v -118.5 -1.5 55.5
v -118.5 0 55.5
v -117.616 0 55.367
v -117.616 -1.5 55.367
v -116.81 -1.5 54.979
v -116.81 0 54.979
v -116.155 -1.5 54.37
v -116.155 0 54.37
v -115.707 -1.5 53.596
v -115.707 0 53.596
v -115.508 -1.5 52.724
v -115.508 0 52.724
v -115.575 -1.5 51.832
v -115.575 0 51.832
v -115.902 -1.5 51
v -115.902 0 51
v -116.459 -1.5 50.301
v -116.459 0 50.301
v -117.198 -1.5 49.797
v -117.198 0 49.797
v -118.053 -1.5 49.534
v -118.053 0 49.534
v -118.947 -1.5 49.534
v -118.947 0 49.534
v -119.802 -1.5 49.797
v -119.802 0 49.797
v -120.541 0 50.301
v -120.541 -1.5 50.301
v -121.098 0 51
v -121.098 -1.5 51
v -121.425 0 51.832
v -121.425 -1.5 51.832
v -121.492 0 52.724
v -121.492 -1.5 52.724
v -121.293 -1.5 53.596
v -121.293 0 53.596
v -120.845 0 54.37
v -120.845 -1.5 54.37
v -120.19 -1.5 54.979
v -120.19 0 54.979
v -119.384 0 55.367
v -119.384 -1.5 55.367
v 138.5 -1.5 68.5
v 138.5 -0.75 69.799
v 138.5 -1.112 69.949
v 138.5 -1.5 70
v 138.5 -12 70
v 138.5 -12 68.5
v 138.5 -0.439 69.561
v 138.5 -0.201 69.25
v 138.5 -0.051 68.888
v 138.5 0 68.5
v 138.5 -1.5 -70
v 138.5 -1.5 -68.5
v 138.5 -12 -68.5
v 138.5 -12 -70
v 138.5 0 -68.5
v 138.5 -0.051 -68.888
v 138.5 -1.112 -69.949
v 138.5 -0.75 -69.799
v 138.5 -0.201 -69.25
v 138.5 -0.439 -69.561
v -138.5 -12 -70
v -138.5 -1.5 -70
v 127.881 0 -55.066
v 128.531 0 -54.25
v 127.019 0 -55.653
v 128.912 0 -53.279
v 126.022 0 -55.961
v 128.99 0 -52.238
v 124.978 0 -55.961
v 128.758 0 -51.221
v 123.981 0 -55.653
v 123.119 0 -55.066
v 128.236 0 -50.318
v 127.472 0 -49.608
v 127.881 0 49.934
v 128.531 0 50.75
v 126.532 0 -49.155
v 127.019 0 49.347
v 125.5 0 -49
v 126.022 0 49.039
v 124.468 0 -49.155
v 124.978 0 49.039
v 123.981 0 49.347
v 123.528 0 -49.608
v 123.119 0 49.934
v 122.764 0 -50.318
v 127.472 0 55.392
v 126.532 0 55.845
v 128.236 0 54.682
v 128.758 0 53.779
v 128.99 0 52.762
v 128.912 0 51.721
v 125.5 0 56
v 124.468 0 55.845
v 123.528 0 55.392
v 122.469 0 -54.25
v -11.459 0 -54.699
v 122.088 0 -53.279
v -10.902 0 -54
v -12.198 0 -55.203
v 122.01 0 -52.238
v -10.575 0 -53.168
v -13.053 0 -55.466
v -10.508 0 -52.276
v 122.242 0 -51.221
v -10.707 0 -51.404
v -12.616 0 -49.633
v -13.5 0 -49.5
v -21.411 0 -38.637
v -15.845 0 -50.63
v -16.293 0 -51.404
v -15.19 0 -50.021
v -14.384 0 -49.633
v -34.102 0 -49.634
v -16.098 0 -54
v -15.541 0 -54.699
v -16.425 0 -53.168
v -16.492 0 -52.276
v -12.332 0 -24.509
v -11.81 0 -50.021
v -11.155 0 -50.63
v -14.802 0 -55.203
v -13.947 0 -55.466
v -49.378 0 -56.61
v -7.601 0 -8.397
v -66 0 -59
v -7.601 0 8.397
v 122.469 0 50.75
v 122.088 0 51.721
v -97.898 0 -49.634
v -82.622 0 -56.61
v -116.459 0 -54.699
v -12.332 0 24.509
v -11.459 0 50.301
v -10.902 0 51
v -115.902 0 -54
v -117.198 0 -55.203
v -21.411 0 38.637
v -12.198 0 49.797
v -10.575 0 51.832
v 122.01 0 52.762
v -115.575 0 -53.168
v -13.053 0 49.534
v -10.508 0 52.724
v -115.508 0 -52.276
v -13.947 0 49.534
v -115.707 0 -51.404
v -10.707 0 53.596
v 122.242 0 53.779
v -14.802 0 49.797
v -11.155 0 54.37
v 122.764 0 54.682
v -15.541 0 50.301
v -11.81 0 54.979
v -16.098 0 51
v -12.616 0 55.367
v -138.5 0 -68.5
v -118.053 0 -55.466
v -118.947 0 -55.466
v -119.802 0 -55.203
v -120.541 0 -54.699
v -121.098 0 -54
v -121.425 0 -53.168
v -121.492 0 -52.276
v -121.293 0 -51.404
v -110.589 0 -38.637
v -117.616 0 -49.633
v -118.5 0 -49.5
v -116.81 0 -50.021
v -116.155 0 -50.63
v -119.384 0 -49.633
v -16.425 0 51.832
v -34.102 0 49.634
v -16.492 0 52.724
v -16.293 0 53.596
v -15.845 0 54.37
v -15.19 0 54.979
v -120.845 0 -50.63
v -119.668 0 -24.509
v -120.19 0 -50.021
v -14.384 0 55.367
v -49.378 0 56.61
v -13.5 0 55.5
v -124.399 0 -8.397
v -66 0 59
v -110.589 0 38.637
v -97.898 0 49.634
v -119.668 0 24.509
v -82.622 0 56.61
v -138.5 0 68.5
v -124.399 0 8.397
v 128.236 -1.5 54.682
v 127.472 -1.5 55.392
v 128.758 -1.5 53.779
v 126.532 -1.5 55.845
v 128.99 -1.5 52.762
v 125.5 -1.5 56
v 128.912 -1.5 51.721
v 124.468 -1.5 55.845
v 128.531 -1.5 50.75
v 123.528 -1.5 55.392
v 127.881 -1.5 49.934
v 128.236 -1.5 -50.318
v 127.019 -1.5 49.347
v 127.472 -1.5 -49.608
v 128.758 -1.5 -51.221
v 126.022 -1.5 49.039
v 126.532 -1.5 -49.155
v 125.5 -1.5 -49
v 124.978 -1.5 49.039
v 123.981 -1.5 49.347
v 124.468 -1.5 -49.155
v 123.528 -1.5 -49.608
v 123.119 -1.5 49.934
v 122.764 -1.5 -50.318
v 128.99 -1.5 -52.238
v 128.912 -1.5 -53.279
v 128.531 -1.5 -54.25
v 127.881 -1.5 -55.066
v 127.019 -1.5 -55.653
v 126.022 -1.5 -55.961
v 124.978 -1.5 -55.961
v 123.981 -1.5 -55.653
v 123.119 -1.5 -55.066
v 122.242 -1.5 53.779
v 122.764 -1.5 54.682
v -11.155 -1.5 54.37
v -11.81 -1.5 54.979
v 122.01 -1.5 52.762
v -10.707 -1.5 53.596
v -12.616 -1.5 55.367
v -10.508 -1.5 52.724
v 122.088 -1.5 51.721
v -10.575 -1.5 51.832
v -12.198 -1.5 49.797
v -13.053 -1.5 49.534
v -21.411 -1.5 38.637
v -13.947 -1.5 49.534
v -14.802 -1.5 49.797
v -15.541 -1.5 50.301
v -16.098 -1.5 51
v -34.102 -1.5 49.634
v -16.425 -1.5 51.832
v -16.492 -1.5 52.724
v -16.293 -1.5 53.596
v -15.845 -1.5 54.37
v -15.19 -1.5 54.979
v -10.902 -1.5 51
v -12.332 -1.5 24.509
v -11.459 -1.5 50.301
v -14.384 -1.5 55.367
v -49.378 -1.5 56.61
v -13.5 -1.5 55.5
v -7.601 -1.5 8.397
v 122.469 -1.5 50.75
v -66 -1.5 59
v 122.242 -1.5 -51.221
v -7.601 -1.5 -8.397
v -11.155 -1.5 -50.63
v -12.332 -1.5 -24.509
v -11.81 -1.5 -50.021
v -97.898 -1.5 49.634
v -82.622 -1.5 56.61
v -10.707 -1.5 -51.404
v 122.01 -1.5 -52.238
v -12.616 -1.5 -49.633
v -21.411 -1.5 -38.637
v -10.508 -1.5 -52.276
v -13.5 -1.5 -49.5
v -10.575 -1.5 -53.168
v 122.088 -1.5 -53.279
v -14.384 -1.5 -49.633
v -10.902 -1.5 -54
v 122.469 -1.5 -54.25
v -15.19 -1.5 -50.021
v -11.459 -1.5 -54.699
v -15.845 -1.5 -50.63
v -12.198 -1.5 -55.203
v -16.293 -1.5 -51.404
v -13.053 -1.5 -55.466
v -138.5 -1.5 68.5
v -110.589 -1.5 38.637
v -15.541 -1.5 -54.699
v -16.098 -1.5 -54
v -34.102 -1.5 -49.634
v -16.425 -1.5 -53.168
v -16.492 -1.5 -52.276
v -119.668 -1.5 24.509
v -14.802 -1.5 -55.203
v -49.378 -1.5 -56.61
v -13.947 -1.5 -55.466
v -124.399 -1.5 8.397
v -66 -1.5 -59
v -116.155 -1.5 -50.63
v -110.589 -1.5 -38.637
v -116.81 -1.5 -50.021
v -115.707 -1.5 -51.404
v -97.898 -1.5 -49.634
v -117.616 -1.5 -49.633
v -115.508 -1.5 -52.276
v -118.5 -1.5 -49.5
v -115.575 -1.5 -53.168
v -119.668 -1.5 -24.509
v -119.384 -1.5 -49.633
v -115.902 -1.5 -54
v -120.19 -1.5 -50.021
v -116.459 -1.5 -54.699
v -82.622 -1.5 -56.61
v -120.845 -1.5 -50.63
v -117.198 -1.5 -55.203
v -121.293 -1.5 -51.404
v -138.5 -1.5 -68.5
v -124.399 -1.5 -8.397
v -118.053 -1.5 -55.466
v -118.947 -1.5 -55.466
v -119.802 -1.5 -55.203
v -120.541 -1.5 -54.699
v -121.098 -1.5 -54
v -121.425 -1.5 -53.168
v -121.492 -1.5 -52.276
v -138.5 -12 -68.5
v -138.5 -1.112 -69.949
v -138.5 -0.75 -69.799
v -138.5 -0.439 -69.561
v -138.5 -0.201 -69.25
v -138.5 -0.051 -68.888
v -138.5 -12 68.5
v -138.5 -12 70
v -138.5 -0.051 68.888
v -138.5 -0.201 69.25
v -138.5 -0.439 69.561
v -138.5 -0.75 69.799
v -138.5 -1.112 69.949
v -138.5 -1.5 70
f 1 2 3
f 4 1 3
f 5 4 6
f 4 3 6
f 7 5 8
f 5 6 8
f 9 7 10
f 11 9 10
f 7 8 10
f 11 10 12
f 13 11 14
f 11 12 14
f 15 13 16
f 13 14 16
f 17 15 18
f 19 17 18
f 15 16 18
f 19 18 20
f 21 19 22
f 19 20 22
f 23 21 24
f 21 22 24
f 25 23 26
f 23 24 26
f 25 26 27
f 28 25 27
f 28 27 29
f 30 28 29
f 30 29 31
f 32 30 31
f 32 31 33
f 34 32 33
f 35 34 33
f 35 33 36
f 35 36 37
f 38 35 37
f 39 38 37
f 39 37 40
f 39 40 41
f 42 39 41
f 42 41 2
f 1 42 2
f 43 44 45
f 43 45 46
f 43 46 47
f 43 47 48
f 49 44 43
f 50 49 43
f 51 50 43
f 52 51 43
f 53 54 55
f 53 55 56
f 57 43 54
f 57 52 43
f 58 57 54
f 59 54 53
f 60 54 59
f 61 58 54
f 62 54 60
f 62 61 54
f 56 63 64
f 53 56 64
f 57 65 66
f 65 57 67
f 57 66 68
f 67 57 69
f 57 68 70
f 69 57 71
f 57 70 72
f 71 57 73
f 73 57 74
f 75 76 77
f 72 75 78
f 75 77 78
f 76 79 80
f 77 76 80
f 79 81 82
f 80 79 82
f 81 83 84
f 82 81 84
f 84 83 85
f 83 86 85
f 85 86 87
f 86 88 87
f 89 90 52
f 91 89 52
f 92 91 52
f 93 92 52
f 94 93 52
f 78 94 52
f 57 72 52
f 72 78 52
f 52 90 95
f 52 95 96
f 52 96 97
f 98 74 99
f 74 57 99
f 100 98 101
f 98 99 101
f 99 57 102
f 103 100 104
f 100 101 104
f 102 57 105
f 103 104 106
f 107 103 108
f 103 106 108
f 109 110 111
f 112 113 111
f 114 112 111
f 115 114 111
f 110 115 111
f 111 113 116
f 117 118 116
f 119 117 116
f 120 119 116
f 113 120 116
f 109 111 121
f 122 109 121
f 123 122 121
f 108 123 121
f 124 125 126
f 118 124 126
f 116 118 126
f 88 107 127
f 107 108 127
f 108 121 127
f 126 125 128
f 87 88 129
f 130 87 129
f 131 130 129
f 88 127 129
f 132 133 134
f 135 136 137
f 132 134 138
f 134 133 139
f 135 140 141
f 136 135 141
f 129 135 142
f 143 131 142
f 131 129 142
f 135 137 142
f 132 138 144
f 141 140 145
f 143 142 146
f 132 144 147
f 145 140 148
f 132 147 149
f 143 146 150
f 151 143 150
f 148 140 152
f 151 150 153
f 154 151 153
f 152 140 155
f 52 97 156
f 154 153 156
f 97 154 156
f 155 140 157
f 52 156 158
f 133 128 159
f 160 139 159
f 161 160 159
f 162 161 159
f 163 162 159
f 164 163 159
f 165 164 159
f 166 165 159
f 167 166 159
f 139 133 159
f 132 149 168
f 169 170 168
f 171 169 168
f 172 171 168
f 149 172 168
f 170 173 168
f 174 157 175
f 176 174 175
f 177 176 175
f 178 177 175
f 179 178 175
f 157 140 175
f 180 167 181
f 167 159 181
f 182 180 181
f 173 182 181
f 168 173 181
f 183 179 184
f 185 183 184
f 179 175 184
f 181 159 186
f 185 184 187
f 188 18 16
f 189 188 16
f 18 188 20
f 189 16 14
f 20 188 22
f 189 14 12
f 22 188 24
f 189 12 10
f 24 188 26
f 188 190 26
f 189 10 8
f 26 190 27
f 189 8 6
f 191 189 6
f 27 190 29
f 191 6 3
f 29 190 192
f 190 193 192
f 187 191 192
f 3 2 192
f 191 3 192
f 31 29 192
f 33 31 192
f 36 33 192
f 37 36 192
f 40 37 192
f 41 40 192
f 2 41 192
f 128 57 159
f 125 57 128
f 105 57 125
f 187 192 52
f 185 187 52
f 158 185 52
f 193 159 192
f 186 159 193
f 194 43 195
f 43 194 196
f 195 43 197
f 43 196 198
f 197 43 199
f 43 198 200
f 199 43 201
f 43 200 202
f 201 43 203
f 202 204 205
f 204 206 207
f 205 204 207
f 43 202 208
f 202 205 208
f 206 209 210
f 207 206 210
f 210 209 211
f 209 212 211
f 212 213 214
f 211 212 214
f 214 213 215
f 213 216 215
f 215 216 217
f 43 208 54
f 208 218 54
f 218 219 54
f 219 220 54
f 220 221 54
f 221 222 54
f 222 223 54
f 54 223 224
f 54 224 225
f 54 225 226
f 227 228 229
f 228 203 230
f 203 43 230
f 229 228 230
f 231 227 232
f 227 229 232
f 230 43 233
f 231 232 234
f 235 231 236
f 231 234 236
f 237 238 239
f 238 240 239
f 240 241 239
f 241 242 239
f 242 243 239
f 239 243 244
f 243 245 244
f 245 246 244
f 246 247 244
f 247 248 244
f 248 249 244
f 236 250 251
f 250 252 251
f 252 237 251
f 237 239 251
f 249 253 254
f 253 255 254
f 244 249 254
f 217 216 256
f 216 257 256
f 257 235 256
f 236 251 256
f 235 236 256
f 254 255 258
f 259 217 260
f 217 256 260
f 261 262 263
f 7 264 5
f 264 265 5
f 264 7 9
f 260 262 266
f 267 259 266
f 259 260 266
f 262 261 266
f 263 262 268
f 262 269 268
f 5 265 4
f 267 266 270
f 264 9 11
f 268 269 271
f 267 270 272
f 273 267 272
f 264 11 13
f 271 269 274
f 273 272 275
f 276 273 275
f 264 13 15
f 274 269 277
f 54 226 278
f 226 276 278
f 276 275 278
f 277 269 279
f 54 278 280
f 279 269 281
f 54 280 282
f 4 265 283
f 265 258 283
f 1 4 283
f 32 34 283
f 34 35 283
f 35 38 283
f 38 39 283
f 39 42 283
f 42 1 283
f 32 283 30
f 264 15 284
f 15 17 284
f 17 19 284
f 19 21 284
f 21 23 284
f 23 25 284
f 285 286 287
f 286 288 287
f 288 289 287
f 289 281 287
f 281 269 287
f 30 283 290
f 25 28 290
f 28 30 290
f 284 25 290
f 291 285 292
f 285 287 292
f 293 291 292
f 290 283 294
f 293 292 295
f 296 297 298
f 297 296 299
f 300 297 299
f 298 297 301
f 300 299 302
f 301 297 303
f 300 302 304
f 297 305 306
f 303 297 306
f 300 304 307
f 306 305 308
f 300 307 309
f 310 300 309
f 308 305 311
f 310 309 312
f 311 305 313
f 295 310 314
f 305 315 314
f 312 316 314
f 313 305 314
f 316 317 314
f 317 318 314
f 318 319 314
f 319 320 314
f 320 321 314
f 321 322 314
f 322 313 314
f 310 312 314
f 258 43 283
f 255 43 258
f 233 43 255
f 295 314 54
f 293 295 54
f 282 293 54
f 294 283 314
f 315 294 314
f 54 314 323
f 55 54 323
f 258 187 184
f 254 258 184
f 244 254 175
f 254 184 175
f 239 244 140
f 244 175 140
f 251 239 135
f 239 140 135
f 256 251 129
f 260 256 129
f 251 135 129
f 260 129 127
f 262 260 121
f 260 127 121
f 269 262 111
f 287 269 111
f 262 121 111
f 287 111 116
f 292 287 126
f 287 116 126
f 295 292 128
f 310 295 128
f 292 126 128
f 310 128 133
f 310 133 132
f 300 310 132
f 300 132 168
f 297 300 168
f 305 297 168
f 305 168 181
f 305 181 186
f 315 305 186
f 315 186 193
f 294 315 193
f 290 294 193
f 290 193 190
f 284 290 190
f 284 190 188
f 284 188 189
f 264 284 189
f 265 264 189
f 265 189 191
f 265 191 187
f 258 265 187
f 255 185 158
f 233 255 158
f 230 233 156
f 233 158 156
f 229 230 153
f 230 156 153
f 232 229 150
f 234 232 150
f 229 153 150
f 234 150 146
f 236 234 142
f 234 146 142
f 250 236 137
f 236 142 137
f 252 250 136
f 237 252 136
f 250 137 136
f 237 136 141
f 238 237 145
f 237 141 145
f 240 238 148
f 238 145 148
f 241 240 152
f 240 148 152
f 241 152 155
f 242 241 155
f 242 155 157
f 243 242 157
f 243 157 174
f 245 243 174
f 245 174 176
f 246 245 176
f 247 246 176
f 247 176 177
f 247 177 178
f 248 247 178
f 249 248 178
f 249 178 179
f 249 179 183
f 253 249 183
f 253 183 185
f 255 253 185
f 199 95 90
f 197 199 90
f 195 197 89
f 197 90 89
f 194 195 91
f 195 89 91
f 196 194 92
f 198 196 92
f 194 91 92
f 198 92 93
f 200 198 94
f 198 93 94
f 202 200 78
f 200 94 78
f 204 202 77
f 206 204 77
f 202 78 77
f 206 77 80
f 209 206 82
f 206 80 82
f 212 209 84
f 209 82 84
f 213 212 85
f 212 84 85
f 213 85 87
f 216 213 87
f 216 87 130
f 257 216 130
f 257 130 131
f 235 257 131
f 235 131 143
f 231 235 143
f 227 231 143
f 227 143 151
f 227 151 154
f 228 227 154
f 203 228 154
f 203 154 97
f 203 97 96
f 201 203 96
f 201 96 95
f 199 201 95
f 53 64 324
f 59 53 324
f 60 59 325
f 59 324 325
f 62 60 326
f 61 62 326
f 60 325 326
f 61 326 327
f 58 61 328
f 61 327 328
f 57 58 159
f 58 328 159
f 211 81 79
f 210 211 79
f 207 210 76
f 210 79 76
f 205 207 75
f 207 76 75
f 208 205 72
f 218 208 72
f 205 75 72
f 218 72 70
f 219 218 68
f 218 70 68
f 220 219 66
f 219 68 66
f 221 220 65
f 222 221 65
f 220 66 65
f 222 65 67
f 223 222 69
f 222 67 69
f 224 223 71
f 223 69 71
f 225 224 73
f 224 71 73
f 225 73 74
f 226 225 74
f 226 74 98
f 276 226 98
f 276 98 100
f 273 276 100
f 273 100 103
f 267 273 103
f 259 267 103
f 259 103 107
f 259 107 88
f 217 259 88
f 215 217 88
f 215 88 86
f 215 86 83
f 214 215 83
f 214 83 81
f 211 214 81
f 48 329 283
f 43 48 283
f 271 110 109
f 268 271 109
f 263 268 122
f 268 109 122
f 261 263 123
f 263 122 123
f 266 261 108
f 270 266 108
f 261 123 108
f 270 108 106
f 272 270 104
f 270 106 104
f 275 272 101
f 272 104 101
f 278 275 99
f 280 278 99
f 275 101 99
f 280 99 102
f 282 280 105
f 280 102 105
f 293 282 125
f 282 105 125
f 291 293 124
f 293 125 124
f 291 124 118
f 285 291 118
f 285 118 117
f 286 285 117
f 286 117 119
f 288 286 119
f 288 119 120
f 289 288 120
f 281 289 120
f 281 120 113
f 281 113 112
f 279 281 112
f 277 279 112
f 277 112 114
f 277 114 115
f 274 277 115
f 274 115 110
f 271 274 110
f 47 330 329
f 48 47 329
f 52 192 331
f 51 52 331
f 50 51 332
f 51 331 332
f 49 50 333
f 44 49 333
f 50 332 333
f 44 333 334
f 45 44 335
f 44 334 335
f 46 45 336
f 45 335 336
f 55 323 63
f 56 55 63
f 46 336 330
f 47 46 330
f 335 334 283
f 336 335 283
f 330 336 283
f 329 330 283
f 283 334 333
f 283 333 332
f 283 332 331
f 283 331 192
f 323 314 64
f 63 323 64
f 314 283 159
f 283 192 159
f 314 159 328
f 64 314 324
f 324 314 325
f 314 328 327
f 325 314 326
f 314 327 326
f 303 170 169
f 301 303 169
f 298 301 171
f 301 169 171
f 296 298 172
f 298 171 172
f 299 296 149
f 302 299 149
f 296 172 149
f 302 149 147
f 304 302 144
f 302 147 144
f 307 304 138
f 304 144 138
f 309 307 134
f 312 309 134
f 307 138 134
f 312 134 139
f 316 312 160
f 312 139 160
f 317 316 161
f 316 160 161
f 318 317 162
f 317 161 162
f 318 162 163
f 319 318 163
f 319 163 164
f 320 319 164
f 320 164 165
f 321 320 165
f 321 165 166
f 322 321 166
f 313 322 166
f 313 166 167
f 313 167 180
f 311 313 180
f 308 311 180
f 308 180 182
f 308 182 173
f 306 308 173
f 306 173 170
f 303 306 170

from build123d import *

# Parameters (mm, degrees)
SM_START               = -138.5
SM_BASE_FLANGE_1_DEPTH = 277
SKETCH_6_R             = 59
SKETCH_6_R_2           = 3
SKETCH_6_R_3           = 3.5
CUT_EXTRUDE_1_DEPTH    = 156.647839689


# Read off the part's stored shape, not the designer's step: 基体-法兰1
with BuildPart() as part:
    # 基体-法兰1 outline → 基体-法兰1 (new body)
    with BuildSketch(Plane(origin=(0, 0, 0), x_dir=(0, 0, -1), z_dir=(1, 0, 0)).offset(SM_START)):
        with BuildLine():
            Line((68.5, -1.5), (68.5, -12))
            Line((68.5, -12), (70, -12))
            Line((70, -12), (70, -1.5))
            ThreePointArc((70, -1.5), (69.560660172, -0.439339828), (68.5, 0))
            Line((68.5, 0), (-68.5, 0))
            ThreePointArc((-68.5, 0), (-69.560660172, -0.439339828), (-70, -1.5))
            Line((-70, -1.5), (-70, -12))
            Line((-70, -12), (-68.5, -12))
            Line((-68.5, -12), (-68.5, -1.5))
            Line((-68.5, -1.5), (68.5, -1.5))
        make_face()
    extrude(amount=SM_BASE_FLANGE_1_DEPTH)

    # 草图6 → 切除-拉伸1 (cut, through all)
    with BuildSketch(Plane(origin=(0, 0, 0), x_dir=(1, 0, 0), z_dir=(0, 1, 0))):
        with Locations(Location((-66, 0, 0), (0, 0, 270))):
            Circle(SKETCH_6_R)
        with Locations(Location((-118.5, 52.5, 0), (0, 0, 270))):
            Circle(SKETCH_6_R_2)
        with Locations(Location((-13.5, 52.5, 0), (0, 0, 270))):
            Circle(SKETCH_6_R_2)
        with Locations(Location((-13.5, -52.5, 0), (0, 0, 270))):
            Circle(SKETCH_6_R_2)
        with Locations(Location((-118.5, -52.5, 0), (0, 0, 270))):
            Circle(SKETCH_6_R_2)
        with Locations(Location((125.5, 52.5, 0), (0, 0, 270))):
            Circle(SKETCH_6_R_3)
        with Locations(Location((125.5, -52.5, 0), (0, 0, 270))):
            Circle(SKETCH_6_R_3)
    extrude(amount=-CUT_EXTRUDE_1_DEPTH, mode=Mode.SUBTRACT)


solid = part.part
